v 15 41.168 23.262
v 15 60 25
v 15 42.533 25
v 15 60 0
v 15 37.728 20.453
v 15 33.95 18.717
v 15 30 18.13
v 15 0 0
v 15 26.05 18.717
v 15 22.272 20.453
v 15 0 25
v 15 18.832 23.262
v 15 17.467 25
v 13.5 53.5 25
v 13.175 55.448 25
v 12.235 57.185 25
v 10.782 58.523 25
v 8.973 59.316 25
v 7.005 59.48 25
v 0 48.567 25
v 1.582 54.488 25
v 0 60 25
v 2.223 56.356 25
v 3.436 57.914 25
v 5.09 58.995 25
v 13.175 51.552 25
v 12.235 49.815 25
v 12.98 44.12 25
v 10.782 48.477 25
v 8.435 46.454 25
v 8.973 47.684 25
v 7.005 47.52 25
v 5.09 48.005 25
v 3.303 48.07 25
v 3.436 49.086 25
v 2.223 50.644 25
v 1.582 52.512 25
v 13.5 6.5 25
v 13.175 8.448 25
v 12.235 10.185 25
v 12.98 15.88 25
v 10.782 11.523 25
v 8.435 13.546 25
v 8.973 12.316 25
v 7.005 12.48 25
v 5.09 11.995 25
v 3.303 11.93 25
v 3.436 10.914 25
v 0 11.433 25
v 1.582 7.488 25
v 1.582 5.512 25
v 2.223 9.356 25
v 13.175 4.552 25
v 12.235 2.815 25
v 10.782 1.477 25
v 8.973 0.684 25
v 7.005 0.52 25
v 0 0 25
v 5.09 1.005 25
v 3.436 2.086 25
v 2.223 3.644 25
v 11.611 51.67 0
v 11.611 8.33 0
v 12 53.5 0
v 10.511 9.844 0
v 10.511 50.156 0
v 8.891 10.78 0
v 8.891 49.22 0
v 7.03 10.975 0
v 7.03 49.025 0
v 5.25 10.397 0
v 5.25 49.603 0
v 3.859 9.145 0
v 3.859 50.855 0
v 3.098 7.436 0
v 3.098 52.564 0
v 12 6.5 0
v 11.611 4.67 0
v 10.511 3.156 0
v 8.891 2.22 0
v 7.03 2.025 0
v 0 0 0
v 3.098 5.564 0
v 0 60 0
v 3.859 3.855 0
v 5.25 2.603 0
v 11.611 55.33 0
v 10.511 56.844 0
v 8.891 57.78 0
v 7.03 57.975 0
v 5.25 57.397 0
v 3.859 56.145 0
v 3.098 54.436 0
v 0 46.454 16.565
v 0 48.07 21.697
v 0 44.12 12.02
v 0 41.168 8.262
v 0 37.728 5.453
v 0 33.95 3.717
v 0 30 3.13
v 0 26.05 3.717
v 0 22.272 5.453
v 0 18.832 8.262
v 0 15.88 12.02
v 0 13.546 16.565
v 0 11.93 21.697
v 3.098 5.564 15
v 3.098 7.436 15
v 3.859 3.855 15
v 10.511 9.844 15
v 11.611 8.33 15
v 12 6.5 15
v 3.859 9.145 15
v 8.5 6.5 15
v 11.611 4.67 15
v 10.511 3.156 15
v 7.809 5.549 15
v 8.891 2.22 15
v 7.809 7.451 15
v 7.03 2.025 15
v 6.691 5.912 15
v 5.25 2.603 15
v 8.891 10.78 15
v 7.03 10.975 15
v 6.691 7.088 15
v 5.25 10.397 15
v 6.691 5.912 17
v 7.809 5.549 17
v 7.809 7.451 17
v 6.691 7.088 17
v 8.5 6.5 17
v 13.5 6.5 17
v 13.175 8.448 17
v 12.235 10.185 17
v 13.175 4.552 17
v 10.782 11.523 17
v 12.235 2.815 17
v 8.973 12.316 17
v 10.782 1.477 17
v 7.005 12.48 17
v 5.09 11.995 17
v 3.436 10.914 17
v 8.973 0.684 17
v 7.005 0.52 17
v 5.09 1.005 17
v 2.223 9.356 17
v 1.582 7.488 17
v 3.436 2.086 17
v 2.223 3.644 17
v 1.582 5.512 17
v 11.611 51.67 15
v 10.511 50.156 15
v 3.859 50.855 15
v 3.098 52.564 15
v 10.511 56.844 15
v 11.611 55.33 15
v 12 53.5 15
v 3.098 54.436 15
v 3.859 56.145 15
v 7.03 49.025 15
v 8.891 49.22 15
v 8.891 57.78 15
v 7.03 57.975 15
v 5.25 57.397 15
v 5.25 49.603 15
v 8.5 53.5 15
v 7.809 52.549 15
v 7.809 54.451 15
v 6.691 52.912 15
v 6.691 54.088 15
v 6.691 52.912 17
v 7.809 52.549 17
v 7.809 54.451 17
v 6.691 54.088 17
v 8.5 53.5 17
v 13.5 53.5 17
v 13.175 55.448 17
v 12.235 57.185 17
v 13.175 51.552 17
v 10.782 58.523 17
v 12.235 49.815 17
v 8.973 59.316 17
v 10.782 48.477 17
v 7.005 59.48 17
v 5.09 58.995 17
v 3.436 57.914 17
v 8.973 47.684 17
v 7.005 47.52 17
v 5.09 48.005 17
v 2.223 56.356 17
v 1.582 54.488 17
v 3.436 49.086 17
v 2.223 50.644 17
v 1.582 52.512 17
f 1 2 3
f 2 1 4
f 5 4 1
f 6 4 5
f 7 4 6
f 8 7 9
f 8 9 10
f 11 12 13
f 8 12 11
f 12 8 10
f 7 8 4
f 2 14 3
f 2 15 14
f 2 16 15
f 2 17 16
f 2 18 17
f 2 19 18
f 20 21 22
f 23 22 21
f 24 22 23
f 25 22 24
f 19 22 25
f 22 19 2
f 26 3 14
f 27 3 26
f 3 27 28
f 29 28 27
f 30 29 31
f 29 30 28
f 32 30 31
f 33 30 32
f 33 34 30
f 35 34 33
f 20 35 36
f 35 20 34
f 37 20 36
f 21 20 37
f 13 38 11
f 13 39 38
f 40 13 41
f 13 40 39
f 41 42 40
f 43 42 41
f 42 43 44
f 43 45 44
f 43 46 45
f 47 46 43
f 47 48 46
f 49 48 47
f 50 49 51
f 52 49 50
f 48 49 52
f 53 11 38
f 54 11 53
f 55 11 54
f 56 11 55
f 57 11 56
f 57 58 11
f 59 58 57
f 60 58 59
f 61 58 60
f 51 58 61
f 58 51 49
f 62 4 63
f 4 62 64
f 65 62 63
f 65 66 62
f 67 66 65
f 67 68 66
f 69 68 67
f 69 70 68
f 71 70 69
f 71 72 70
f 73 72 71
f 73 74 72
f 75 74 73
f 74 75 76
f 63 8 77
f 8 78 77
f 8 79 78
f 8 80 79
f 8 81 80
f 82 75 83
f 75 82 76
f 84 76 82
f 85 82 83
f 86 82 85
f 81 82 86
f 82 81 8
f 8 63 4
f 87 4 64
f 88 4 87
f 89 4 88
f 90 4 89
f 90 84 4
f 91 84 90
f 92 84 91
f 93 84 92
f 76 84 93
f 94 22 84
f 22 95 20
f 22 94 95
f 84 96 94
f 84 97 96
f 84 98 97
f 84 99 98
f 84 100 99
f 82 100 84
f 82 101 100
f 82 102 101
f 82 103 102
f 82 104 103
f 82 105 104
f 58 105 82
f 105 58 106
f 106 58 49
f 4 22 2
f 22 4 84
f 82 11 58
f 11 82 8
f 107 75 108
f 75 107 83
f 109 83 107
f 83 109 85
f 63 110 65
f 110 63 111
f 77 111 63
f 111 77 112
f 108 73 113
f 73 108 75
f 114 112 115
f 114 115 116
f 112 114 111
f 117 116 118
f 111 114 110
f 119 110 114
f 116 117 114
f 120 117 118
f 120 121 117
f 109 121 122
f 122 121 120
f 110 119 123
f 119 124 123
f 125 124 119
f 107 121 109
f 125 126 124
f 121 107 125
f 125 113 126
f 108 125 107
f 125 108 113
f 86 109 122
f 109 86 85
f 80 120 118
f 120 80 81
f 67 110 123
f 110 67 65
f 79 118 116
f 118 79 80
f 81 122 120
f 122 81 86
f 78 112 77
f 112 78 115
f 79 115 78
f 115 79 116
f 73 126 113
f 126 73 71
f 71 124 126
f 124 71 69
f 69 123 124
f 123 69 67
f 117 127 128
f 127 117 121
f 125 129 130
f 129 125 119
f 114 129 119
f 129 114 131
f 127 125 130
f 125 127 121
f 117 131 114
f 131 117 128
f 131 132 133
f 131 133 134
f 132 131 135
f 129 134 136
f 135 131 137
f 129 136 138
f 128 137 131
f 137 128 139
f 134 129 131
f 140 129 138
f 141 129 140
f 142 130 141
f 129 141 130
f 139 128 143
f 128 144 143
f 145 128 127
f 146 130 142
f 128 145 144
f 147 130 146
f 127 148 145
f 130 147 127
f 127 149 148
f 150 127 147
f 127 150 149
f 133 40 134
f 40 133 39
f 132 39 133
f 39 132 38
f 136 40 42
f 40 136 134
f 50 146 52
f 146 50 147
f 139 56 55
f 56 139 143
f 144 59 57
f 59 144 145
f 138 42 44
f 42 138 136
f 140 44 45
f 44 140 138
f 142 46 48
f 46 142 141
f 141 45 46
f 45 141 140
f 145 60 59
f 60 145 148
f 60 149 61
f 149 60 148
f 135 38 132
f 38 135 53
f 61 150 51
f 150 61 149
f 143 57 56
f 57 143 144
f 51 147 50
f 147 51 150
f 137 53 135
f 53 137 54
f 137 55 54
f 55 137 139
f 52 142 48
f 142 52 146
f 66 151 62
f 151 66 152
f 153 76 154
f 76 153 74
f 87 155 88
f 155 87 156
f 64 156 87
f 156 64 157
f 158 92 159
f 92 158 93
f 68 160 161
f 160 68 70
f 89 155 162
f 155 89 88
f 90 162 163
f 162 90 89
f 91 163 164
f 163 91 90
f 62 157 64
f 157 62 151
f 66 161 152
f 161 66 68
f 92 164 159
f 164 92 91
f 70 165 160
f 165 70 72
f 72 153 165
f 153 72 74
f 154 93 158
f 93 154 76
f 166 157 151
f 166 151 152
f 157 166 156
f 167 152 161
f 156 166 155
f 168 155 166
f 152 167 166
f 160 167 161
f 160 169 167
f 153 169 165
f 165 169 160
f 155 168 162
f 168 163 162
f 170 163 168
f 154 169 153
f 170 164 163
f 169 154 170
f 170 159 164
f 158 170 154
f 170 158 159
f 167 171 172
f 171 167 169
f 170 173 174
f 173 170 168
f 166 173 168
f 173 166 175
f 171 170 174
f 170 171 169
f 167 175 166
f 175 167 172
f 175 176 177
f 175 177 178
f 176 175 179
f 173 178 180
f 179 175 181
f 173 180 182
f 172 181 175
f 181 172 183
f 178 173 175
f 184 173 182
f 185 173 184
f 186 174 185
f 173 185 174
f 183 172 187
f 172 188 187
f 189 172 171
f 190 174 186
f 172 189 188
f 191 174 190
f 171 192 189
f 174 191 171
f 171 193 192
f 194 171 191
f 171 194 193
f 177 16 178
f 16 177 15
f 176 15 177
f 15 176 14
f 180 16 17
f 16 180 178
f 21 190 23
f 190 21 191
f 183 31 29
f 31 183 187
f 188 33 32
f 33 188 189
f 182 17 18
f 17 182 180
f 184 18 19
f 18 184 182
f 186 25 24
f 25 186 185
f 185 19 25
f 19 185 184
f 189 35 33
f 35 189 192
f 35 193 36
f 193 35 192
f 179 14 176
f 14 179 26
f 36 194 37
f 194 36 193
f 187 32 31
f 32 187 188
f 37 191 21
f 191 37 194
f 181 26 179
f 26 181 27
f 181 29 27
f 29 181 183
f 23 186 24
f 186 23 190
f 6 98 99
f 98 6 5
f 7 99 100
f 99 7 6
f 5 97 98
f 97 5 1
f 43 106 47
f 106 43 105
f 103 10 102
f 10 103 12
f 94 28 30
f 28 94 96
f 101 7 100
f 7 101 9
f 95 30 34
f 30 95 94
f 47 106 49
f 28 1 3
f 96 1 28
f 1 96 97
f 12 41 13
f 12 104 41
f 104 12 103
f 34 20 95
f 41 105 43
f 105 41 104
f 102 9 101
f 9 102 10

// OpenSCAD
//schrauben sind 2,9 x ~13 blechschrauben
//müssen ersetzt werden durch andere/längere.
//länge der schrauben wird durch oberteil bestimmt.
//22 sind die längsten 2,9er
difference(){
    //grundkörper
    cube([15,60,25]);
    //sackloch zum aufstecken des grundkoerpers
    translate([7.5,6.5,0]) cylinder(d1=9,d2=9,h=15);
    //zentrierbohrung schraube
    translate([7.5,6.5,14]) cylinder(d1=2,d2=2,h=15);
    //versenkung befestigungsschraube
    translate([7.5,6.5,17]) cylinder(d1=12,d2=12,h=15);
    //zweites sackloch
    translate([7.5,60-6.5,0]) cylinder(d1=9,d2=9,h=15);
    //zentrierbohrung schraube
    translate([7.5,60-6.5,14]) cylinder(d1=2,d2=2,h=15);
    //versenkung befestigungsschraube
    translate([7.5,60-6.5,17]) cylinder(d1=12,d2=12,h=15);
    //ausschnitt schräge einfassung der baufassung
    translate([-15,30,15]) rotate([0,45,0]) cylinder(d1=38,d2=38,h=60);
}
